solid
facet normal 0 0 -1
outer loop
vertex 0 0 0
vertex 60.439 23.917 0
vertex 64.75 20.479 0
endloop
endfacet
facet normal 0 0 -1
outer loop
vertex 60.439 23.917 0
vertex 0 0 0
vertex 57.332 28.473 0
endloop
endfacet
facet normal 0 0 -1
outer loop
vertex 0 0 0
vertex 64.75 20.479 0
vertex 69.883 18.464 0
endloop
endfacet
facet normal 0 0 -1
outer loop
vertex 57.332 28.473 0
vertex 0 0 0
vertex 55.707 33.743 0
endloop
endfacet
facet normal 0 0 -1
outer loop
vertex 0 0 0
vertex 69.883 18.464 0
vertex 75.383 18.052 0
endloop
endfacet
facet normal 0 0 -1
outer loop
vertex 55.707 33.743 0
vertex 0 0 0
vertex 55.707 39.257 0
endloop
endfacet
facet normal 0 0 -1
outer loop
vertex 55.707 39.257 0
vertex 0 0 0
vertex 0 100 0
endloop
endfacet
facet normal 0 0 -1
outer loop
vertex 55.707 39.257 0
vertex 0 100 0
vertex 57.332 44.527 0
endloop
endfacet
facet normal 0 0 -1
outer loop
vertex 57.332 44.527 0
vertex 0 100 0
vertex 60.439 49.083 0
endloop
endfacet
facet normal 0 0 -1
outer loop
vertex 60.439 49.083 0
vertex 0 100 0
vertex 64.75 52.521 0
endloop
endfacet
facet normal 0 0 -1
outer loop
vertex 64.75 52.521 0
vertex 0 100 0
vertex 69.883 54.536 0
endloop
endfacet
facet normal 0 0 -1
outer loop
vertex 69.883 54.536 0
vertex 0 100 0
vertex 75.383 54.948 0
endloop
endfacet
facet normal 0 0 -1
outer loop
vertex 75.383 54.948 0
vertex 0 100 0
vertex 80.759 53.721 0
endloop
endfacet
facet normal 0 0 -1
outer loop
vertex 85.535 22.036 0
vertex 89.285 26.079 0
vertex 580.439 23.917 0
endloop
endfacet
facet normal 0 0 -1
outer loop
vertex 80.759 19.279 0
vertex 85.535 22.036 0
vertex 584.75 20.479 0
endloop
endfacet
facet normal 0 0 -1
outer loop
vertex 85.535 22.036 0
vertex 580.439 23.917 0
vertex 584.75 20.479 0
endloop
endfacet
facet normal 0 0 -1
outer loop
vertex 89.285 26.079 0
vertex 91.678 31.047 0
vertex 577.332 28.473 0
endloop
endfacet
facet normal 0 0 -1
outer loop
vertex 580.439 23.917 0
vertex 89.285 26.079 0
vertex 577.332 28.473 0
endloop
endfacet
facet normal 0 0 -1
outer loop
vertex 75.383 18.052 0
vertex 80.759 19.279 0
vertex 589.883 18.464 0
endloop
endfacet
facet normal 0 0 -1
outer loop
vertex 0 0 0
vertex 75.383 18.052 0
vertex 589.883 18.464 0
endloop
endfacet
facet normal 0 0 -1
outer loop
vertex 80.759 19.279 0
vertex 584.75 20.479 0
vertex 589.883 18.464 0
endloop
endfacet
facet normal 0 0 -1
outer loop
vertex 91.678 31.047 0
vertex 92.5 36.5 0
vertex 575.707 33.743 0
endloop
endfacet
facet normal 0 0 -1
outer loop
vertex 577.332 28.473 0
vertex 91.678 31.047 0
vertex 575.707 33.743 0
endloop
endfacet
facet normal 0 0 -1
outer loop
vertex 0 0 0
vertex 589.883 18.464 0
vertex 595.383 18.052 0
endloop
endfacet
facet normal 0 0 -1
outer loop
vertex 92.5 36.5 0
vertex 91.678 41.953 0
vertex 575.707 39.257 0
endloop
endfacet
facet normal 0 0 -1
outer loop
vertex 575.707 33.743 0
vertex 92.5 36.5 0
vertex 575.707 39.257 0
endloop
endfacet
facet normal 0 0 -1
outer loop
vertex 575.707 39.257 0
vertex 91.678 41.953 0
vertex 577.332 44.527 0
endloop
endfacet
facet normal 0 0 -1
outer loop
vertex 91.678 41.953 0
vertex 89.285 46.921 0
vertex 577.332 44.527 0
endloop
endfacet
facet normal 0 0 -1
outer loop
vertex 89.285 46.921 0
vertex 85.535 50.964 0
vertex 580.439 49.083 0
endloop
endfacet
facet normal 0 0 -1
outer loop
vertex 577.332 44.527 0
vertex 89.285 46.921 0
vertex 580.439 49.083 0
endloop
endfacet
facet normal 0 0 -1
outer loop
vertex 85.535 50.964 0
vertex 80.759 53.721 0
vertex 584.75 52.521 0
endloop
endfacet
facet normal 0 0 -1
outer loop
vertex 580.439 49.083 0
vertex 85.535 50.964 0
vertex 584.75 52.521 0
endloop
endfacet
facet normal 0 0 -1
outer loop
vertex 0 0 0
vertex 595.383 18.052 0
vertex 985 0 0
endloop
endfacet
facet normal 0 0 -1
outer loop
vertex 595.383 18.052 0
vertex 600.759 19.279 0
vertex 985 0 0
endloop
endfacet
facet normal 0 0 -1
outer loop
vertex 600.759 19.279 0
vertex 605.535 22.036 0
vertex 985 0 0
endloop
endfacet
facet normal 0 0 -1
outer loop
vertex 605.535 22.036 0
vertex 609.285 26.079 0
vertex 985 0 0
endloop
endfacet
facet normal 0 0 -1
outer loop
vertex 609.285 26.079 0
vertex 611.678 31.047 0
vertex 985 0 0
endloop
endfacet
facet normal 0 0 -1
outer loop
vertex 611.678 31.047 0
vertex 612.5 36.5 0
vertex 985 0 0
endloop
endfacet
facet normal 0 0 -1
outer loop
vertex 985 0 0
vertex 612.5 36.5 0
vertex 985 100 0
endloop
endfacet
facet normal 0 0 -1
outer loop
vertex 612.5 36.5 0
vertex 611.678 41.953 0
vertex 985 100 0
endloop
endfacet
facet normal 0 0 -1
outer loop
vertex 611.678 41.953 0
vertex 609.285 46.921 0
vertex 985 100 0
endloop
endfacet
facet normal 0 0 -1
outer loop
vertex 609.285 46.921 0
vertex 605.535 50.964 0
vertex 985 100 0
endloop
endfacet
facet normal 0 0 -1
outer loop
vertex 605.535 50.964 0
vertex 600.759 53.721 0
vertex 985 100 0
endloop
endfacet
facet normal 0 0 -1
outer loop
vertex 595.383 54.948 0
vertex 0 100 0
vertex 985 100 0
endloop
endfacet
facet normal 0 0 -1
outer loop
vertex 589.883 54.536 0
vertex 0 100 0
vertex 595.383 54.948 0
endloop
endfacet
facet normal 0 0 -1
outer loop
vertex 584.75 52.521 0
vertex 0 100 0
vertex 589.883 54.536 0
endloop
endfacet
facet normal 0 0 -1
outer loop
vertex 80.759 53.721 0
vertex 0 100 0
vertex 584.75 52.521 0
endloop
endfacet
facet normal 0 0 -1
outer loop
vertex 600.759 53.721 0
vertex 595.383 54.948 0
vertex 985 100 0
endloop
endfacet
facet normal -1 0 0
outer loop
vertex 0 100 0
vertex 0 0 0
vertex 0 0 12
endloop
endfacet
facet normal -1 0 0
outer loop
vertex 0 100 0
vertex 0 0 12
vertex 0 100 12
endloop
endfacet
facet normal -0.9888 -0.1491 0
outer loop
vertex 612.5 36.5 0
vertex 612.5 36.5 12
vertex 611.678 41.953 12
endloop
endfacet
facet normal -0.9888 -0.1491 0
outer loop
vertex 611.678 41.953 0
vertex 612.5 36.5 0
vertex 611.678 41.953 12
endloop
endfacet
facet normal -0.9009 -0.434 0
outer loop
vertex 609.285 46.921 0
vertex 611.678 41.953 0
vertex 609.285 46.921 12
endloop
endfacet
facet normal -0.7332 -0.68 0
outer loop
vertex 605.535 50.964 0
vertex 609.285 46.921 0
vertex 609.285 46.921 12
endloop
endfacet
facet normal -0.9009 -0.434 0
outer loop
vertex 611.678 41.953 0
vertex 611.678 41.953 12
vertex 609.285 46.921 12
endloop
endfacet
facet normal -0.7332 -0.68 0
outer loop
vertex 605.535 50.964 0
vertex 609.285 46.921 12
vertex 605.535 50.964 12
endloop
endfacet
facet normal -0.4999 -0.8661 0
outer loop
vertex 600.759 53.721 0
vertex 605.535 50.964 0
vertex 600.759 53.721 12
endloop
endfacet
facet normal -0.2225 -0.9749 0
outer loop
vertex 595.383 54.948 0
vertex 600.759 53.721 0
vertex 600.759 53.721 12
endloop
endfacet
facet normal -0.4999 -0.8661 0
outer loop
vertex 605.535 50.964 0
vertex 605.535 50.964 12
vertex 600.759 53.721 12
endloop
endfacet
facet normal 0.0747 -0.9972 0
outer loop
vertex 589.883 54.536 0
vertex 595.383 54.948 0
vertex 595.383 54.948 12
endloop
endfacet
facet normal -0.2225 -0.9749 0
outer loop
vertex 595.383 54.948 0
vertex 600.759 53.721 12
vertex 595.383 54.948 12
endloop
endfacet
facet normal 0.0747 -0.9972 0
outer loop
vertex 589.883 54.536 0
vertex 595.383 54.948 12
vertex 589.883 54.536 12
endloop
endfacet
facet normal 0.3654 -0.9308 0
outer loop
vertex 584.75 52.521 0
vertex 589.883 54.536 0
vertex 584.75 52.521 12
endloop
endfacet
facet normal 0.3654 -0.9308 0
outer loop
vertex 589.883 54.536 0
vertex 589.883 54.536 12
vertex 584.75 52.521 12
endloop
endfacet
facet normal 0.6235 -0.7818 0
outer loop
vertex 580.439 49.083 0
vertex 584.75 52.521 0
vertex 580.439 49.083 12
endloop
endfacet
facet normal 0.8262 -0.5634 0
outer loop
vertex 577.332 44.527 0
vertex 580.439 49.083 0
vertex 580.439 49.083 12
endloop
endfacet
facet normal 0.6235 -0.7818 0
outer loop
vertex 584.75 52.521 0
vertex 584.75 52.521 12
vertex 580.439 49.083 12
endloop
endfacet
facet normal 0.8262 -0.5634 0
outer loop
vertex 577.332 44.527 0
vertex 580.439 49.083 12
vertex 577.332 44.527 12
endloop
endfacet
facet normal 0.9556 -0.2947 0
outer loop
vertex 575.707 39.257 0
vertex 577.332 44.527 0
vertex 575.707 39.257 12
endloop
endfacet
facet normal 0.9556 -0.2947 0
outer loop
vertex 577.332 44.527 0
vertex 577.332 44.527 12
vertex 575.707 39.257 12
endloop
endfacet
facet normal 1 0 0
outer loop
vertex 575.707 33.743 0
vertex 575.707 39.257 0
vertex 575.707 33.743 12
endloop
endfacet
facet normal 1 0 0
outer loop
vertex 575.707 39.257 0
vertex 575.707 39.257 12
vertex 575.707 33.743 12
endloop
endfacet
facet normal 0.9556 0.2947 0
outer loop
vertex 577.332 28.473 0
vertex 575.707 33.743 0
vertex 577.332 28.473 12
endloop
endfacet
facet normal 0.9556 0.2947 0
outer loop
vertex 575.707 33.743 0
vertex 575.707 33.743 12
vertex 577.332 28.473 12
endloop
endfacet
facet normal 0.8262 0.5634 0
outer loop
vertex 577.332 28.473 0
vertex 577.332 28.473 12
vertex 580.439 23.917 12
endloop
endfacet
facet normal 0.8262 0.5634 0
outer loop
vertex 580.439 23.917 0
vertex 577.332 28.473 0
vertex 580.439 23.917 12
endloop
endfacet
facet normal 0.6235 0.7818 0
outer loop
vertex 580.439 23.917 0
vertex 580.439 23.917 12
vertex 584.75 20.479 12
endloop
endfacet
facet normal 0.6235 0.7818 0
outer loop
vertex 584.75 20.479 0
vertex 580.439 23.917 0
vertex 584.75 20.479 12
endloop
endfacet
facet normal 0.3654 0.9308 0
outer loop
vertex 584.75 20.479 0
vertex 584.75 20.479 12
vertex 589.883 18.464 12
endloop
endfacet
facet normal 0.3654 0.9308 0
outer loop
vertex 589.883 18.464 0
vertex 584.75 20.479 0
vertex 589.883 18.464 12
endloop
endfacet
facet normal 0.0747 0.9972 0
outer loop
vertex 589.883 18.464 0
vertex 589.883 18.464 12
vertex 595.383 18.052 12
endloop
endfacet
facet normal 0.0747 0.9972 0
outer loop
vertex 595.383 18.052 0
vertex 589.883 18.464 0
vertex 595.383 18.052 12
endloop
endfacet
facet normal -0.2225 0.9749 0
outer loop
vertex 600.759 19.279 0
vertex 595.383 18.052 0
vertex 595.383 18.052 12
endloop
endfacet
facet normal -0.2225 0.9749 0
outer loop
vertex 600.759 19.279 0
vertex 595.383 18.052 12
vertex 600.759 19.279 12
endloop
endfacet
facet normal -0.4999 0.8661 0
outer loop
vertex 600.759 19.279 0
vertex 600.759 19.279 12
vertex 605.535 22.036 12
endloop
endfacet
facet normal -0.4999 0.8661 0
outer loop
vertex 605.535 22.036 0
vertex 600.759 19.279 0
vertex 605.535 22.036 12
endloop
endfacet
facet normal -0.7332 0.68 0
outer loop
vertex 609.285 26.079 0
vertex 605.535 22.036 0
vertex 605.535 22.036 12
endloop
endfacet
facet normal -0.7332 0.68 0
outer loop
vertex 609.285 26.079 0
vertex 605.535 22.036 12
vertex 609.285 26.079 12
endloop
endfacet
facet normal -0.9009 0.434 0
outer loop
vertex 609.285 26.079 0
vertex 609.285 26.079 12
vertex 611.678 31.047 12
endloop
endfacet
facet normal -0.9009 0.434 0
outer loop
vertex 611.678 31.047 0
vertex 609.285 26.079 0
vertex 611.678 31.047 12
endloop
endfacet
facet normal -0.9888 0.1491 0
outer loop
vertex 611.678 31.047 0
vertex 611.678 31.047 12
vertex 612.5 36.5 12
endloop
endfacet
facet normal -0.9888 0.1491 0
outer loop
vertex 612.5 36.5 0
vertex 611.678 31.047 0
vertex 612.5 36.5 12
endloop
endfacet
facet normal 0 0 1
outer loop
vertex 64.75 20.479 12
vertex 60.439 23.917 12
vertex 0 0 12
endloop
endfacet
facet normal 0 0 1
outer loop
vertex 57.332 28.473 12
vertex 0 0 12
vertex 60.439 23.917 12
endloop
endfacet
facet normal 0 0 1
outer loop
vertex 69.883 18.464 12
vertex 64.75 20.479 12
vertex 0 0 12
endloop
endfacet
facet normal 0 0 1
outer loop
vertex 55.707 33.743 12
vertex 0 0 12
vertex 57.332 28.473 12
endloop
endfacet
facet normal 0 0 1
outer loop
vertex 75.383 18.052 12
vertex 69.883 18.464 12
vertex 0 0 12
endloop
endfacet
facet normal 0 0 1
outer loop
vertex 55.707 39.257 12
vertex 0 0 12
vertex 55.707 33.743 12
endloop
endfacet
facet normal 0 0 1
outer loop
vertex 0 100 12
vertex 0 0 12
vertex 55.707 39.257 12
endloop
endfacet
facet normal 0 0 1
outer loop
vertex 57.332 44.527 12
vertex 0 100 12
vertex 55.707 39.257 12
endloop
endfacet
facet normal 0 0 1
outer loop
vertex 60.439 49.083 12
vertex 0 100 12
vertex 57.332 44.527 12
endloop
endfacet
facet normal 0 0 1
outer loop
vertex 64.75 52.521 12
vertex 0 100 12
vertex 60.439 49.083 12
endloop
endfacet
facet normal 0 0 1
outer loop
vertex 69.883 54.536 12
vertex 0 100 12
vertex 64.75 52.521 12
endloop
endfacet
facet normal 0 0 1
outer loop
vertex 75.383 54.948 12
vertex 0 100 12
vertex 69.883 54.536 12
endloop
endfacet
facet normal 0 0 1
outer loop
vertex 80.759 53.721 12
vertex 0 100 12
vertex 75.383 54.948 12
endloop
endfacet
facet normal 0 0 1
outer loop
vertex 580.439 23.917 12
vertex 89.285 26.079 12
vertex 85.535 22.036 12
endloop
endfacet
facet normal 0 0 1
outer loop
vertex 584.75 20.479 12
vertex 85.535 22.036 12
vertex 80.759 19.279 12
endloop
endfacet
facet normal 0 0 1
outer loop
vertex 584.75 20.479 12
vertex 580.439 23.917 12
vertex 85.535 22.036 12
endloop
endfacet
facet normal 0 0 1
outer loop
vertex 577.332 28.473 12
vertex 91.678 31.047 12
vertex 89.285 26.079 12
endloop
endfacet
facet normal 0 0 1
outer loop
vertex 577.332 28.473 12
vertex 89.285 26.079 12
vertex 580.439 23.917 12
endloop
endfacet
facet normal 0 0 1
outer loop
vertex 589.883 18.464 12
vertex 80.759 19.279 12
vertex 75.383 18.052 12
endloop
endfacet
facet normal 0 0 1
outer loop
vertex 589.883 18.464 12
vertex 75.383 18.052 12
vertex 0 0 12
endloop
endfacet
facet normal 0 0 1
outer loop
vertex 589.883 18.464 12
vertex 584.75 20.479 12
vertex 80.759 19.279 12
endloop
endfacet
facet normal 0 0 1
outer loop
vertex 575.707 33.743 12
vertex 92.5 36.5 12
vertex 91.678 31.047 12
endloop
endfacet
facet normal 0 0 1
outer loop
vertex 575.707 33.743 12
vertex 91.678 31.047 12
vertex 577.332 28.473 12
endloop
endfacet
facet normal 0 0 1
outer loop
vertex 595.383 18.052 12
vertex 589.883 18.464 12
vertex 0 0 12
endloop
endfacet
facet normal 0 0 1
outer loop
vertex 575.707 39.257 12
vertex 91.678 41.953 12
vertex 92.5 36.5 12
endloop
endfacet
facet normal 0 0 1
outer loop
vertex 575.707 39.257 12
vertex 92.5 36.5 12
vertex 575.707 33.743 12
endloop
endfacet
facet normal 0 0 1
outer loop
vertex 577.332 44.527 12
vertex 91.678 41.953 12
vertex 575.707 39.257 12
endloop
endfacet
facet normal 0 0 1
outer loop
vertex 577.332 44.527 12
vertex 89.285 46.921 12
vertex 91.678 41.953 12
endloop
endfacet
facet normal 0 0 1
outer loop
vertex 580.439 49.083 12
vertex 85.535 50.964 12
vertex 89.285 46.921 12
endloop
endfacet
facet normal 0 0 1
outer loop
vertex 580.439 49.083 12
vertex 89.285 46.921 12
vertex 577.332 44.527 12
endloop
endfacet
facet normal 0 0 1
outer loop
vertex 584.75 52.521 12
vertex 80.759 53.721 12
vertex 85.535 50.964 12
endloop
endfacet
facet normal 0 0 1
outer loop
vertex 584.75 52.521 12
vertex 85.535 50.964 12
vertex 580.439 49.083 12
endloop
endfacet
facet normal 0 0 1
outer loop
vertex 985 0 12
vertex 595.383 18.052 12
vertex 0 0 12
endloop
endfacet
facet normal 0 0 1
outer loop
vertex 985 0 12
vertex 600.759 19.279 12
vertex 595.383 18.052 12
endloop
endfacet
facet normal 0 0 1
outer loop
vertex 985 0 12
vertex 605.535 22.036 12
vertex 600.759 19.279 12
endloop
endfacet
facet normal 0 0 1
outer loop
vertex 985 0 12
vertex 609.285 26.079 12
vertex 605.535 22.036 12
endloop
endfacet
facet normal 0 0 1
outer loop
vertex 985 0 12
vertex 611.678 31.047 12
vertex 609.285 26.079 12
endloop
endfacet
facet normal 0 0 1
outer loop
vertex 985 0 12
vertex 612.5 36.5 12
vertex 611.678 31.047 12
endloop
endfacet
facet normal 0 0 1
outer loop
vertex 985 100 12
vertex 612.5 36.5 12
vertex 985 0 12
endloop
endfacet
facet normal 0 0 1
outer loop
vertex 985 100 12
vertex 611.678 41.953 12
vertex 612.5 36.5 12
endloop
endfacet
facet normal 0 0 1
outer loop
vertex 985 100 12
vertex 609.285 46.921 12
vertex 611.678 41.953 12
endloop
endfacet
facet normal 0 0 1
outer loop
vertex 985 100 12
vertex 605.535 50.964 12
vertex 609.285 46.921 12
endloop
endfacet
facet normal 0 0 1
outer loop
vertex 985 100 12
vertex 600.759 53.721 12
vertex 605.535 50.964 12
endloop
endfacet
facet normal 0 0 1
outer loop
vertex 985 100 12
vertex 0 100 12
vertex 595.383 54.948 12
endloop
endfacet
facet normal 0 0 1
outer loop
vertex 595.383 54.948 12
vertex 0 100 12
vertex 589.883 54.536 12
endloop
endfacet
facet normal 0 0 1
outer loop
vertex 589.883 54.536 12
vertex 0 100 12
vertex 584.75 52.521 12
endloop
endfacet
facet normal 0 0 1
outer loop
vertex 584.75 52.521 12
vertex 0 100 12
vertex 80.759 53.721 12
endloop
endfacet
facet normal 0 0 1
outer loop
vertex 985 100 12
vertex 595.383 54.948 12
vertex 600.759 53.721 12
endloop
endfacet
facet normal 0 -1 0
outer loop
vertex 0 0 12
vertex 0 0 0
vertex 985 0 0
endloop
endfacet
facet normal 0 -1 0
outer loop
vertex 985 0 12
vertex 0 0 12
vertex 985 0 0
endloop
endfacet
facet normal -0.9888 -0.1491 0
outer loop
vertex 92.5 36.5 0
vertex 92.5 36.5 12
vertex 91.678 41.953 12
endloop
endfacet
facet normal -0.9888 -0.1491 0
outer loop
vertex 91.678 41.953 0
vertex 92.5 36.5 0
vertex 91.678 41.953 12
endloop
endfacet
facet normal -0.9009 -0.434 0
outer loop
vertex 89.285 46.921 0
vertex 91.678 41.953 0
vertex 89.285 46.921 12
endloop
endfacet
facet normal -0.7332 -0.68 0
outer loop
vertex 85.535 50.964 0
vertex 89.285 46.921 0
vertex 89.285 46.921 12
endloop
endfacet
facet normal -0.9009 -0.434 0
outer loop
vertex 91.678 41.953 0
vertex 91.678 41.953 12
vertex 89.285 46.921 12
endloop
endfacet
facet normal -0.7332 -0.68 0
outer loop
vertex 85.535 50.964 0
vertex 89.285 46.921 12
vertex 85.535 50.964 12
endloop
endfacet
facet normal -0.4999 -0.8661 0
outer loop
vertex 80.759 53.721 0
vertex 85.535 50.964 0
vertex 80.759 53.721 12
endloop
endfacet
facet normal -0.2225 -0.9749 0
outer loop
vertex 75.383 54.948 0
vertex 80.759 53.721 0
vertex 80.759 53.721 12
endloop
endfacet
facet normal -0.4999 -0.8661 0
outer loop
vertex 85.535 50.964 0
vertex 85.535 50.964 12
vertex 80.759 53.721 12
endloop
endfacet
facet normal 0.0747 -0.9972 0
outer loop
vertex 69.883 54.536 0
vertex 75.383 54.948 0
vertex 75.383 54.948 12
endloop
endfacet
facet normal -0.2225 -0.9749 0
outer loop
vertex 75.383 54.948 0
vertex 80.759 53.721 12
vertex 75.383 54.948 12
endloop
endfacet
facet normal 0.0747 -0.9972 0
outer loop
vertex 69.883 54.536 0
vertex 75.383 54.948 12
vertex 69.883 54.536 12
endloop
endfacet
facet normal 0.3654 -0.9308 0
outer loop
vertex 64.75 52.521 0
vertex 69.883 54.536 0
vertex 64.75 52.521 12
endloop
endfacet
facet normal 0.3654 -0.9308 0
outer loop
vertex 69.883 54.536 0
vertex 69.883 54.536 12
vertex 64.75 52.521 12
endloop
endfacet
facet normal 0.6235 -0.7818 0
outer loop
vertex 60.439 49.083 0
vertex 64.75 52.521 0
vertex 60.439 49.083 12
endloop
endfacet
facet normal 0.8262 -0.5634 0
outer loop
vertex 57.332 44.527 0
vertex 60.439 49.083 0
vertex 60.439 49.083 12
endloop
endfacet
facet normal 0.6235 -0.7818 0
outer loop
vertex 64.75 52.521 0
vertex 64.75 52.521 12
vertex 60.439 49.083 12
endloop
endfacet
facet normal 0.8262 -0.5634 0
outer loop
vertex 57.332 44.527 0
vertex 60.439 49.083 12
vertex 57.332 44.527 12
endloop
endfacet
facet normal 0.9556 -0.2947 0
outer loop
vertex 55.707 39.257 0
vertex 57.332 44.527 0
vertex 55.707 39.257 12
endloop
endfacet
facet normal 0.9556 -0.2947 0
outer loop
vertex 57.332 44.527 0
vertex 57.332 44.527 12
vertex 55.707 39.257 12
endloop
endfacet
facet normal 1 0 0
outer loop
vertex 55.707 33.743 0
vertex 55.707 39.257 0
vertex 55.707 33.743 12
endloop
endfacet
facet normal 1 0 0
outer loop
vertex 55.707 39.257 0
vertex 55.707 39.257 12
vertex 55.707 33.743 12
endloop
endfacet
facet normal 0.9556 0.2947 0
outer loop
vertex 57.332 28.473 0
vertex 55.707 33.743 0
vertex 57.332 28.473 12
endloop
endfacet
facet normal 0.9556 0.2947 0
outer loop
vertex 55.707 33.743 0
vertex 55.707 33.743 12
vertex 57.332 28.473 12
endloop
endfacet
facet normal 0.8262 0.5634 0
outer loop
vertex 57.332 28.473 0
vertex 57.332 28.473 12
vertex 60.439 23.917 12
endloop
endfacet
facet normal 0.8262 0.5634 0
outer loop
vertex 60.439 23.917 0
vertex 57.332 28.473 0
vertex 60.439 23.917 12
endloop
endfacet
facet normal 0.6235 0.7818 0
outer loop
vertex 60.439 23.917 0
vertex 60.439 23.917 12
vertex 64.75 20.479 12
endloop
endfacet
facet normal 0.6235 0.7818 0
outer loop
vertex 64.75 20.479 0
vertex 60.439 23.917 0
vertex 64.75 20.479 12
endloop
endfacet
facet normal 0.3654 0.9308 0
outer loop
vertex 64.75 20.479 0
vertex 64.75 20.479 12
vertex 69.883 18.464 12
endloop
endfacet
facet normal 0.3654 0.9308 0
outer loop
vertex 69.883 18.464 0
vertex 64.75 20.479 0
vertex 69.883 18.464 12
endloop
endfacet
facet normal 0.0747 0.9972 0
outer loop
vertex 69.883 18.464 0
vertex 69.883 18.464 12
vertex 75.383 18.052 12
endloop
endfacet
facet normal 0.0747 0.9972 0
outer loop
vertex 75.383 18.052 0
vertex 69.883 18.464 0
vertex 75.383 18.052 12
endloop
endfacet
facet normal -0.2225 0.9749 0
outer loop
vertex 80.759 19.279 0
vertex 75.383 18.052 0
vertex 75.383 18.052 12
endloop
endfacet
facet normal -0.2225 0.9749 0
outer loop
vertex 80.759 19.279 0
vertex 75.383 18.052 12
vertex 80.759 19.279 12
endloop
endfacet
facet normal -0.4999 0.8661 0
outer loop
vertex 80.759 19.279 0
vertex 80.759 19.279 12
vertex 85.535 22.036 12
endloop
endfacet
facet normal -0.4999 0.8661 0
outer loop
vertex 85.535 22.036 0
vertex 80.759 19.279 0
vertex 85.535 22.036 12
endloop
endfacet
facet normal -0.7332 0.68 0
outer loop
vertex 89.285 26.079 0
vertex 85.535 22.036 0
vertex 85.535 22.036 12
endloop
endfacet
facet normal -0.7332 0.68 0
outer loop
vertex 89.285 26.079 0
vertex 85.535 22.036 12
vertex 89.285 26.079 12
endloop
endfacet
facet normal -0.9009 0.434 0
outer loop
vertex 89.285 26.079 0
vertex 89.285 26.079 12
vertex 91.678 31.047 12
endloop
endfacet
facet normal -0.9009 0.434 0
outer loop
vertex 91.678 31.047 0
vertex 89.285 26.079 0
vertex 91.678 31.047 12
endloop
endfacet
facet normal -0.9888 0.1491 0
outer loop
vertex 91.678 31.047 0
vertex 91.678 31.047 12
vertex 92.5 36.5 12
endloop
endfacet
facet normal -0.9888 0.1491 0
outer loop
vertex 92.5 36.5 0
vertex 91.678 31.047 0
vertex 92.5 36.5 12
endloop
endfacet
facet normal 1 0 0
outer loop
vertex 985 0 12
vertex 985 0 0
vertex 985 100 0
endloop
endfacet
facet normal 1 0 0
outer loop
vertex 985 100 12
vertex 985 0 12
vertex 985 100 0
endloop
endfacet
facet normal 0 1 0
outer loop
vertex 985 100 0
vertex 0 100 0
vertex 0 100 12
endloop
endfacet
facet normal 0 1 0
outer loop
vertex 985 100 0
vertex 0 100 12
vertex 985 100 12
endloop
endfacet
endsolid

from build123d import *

# Parameters (mm, degrees)
CROQUIS1_W                 = 985
CROQUIS1_H                 = 100
SALIENTE_EXTRUIR1_DEPTH    = 12
CROQUIS2_R                 = 18.5
CORTAR_EXTRUIR1_DEPTH      = 1
CORTAR_EXTRUIR1_DEPTH_BACK = 13
CROQUIS3_R                 = 18.5
CORTAR_EXTRUIR2_DEPTH      = 13


with BuildPart() as part:
    # Croquis1 → Saliente-Extruir1 (new body)
    with BuildSketch(Plane.XY):
        with Locations((492.5, 50)):
            Rectangle(CROQUIS1_W, CROQUIS1_H)
    extrude(amount=SALIENTE_EXTRUIR1_DEPTH)

    # Croquis2 → Cortar-Extruir1 (cut, two sides)
    with BuildSketch(Plane.XY.offset(12)) as cortar_extruir1_sk:
        with Locations((74, 36.5)):
            Circle(CROQUIS2_R)
    extrude(amount=CORTAR_EXTRUIR1_DEPTH, mode=Mode.SUBTRACT)
    extrude(cortar_extruir1_sk.sketch, amount=-CORTAR_EXTRUIR1_DEPTH_BACK, mode=Mode.SUBTRACT)

    # Croquis3 → Cortar-Extruir2 (cut, through all)
    with BuildSketch(Plane.XY.offset(12)):
        with Locations((594, 36.5)):
            Circle(CROQUIS3_R)
    extrude(amount=-CORTAR_EXTRUIR2_DEPTH, mode=Mode.SUBTRACT)


solid = part.part
